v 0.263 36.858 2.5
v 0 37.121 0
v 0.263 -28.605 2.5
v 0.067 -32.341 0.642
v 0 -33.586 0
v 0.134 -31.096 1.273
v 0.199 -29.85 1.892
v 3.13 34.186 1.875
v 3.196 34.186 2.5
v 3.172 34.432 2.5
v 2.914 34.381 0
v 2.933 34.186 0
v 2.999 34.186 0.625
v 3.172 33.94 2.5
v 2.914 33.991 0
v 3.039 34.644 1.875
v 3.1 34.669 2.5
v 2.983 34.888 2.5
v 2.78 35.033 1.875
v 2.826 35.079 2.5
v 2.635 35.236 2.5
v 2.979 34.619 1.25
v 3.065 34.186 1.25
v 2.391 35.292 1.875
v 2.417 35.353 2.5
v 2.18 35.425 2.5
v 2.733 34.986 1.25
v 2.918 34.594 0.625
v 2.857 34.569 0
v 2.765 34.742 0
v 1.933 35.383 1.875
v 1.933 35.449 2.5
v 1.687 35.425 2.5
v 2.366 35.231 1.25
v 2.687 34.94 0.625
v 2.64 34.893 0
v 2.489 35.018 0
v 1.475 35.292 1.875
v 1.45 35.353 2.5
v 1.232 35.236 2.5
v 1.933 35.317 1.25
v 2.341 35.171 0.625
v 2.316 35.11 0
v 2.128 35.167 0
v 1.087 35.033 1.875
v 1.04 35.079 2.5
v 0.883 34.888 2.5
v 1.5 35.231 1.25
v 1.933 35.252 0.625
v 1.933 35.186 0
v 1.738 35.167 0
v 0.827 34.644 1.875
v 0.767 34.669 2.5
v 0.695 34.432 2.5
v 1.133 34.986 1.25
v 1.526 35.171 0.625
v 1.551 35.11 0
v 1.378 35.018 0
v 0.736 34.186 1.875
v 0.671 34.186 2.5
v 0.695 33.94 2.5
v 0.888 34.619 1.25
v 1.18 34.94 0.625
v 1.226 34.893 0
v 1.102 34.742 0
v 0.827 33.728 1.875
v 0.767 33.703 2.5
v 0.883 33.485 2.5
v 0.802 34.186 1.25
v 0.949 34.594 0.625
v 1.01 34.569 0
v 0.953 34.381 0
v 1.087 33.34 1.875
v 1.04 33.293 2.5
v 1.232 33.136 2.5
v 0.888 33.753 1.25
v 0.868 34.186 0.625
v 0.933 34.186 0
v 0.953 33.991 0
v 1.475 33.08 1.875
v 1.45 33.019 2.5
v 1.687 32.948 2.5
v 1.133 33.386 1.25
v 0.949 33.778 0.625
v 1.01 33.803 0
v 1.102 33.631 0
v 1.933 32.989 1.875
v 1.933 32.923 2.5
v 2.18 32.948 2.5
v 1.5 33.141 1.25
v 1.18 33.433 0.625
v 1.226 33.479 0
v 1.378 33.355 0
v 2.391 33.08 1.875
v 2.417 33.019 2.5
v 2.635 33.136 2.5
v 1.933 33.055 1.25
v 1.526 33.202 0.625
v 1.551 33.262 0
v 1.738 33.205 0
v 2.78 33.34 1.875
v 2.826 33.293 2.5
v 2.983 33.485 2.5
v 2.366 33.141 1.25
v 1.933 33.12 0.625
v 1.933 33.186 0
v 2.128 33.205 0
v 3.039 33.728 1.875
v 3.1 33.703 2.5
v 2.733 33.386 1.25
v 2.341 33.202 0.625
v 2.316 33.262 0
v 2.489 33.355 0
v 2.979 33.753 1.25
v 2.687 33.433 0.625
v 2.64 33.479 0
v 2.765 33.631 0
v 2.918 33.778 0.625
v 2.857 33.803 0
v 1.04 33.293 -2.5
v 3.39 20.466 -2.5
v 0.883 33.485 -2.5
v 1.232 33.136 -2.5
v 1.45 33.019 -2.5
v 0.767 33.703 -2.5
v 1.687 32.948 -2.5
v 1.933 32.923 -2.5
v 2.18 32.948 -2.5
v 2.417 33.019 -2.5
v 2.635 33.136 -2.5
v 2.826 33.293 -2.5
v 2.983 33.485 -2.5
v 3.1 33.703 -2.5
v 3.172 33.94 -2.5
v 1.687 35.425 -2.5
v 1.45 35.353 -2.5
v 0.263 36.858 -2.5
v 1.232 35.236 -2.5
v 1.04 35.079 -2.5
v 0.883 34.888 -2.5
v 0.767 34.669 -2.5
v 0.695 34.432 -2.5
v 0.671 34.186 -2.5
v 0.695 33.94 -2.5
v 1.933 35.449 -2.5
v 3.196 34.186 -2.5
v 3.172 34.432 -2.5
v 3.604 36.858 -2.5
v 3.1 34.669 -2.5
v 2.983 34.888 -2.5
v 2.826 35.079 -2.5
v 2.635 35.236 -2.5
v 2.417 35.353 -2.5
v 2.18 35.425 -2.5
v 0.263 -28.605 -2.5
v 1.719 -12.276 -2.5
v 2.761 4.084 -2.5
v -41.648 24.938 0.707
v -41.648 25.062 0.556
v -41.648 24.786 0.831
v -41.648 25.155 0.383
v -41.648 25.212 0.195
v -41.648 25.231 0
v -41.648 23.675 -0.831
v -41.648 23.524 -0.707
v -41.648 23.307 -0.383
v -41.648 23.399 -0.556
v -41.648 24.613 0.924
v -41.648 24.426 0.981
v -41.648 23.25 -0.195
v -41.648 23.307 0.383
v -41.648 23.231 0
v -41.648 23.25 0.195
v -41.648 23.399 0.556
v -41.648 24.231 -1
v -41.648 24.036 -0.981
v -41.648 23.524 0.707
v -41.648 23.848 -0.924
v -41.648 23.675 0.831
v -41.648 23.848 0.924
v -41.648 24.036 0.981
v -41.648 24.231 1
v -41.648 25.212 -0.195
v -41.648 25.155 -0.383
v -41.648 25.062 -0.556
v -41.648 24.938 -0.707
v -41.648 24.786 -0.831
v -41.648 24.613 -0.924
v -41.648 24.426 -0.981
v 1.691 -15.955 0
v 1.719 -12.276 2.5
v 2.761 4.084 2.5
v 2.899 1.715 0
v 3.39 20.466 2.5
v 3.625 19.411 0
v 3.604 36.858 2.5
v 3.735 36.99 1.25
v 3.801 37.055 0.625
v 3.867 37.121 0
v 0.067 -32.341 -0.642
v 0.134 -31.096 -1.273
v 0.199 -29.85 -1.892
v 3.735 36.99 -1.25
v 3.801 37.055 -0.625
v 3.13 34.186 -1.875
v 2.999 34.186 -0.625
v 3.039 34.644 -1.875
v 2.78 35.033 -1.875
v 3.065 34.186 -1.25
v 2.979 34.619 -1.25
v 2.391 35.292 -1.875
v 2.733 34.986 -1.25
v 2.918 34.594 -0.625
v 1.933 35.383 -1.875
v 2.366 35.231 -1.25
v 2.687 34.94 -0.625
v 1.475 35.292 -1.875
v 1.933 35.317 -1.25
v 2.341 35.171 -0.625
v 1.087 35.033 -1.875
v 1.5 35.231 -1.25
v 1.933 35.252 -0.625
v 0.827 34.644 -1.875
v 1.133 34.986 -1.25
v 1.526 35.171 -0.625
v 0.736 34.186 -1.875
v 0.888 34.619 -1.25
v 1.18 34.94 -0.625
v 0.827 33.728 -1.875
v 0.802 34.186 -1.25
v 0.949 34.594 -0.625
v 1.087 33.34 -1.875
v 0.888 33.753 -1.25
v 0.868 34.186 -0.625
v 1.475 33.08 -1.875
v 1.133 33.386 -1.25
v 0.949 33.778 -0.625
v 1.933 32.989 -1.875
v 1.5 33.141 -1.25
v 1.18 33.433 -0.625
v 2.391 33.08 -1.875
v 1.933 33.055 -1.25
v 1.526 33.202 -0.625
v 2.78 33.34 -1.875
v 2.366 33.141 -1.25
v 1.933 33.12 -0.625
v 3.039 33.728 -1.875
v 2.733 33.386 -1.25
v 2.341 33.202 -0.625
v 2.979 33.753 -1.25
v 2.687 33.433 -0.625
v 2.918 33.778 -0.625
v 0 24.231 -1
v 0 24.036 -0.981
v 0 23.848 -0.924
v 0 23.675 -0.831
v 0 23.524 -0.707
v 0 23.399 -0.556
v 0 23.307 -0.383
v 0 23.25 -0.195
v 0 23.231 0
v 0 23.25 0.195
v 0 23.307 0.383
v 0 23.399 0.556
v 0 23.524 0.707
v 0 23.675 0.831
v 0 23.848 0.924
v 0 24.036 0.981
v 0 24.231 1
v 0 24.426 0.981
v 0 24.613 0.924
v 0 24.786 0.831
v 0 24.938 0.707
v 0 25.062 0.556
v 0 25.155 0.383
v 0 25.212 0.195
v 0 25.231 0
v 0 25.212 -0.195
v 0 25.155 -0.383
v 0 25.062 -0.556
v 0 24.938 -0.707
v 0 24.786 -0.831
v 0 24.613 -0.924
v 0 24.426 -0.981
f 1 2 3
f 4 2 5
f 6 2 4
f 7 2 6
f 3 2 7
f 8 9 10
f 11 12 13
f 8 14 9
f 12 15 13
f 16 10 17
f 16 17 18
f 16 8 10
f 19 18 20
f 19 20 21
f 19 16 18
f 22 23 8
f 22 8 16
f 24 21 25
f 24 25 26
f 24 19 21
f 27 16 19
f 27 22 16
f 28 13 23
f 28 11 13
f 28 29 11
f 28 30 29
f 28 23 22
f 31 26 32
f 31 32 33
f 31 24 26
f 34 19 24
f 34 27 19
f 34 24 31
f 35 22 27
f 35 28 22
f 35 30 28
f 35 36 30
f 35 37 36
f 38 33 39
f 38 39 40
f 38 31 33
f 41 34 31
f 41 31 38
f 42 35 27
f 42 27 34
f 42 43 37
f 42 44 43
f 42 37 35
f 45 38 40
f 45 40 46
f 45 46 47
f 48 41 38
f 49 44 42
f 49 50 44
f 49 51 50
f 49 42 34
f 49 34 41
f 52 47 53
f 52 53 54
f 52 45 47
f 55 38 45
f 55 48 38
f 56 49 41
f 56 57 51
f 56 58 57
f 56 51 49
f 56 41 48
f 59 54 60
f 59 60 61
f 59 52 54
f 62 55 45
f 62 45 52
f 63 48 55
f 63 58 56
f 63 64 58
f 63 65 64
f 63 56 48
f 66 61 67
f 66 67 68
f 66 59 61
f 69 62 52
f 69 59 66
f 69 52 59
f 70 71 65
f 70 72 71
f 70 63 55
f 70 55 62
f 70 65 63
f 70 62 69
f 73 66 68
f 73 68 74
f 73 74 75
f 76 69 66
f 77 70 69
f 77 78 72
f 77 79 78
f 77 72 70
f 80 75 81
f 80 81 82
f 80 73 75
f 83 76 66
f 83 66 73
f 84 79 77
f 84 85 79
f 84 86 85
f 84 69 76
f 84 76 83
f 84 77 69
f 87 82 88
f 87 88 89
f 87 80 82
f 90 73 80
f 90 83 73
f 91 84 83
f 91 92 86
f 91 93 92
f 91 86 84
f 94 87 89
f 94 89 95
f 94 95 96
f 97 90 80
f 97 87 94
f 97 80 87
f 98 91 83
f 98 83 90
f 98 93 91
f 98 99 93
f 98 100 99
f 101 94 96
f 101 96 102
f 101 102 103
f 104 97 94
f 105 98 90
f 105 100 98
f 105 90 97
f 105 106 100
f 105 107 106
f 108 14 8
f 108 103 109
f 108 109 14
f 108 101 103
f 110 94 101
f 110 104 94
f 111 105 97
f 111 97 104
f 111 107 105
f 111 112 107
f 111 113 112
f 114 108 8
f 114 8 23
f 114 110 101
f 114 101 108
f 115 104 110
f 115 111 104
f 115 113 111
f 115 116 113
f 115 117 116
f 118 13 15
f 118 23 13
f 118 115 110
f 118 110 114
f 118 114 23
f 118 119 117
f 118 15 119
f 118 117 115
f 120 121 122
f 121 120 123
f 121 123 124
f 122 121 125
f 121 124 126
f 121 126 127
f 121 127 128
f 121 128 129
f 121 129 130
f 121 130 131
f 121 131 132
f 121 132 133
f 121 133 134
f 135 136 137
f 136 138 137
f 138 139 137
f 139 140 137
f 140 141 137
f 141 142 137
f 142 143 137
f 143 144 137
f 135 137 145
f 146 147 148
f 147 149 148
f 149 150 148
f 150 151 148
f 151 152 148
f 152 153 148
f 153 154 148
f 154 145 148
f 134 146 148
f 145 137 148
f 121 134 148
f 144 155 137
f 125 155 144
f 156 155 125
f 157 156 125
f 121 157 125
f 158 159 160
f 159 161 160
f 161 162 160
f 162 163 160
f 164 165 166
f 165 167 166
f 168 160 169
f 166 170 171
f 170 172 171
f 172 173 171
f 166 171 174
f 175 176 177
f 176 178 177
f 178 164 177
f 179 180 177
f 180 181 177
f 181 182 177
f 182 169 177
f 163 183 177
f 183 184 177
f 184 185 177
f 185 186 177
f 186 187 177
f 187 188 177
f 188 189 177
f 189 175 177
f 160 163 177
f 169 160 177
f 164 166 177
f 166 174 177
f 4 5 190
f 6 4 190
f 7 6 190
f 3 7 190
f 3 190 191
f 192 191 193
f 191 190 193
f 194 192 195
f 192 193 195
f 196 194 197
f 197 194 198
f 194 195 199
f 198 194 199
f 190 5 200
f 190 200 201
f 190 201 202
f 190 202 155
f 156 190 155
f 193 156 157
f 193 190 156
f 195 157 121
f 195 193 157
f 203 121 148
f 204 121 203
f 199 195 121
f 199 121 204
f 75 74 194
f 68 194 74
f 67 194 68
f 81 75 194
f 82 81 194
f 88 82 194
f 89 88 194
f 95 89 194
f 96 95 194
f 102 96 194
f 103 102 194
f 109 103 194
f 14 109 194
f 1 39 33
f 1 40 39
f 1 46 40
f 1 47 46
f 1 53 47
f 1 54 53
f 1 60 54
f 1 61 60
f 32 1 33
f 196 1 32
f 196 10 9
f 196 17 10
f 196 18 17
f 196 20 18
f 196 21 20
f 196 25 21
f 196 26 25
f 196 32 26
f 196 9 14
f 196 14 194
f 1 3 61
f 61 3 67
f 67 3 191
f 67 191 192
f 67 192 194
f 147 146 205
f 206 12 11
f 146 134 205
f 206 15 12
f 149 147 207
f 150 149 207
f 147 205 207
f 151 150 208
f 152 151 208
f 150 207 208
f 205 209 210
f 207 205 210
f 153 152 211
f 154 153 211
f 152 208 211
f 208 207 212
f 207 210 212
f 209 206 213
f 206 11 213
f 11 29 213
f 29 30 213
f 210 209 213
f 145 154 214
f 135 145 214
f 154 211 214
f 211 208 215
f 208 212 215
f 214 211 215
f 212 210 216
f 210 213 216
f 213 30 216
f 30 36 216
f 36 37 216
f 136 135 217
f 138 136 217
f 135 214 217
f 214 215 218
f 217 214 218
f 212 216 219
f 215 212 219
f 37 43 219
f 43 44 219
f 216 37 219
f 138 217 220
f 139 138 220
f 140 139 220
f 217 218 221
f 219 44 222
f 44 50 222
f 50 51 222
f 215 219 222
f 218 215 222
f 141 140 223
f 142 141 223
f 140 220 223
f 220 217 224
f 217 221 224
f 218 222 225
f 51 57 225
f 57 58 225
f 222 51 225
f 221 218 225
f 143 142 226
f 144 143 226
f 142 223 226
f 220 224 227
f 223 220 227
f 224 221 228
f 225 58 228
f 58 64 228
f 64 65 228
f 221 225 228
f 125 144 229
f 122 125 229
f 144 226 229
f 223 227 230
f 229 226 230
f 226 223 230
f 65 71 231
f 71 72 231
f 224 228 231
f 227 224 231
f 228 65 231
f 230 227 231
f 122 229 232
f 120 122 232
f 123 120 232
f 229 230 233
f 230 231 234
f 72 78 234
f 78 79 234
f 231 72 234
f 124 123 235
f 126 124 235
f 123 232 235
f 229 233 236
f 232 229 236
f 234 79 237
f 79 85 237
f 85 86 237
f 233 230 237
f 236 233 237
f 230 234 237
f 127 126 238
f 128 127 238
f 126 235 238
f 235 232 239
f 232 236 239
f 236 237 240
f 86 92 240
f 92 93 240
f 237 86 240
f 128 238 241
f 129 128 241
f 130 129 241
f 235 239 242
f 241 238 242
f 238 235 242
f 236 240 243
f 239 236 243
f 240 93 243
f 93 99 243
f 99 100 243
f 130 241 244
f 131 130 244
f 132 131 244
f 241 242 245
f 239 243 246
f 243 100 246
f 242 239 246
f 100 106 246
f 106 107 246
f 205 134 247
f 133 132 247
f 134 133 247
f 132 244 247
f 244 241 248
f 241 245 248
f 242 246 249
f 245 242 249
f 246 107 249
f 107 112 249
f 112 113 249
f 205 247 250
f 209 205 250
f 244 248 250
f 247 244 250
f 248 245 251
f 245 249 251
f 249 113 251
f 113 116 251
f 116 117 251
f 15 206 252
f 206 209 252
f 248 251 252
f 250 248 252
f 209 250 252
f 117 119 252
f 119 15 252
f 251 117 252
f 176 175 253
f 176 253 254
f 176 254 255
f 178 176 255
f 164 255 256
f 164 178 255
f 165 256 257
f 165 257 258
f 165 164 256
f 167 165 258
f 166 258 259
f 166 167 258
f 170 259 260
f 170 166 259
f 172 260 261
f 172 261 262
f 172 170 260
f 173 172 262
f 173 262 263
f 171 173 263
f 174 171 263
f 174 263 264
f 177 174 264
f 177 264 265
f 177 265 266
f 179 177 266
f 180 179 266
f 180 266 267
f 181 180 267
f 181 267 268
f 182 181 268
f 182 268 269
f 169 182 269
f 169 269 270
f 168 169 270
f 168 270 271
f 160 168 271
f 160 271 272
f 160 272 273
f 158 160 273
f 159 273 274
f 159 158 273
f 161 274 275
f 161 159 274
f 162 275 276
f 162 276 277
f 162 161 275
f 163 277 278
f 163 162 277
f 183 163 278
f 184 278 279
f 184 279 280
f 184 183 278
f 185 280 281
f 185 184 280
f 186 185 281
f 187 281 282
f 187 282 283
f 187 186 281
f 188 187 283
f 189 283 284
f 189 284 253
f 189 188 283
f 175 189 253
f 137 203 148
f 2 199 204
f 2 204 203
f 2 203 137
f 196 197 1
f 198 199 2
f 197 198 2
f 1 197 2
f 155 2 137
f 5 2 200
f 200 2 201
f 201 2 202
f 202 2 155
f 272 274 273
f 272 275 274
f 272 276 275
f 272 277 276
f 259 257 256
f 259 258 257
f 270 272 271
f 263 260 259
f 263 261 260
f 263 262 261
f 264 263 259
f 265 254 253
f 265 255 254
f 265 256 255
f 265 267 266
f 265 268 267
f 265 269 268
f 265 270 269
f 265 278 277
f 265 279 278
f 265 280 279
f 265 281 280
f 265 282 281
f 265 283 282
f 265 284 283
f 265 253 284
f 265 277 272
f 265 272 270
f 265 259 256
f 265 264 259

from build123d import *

# Parameters (mm, degrees)
SKETCH1_R                     = 1
BOSS_EXTRUDE1_DEPTH           = 2.5
BOSS_EXTRUDE1_DRAFT           = 6
BOSS_EXTRUDE1_OTHER_WAY_DEPTH = 2.5
BOSS_EXTRUDE1_OTHER_WAY_DRAFT = -6
SKETCH2_R                     = 1


with BuildPart() as part:
    # Sketch1 → Boss-Extrude1 (with draft: the straight prism first)
    with BuildSketch(Plane.XY):
        with BuildLine():
            Line((0, 37.120938716), (0, -33.585611219))
            ThreePointArc((0, -33.585611219), (2.89935164, 1.714837296), (3.86676445, 37.120938716))
            Line((3.86676445, 37.120938716), (0, 37.120938716))
        make_face()
        with Locations((1.933382225, 34.186107729)):
            Circle(SKETCH1_R, mode=Mode.SUBTRACT)
    extrude(amount=BOSS_EXTRUDE1_DEPTH)
    # Boss-Extrude1: the draft: its side faces are tilted about the plane it starts from
    boss_extrude1_sides = [part.faces().sort_by_distance(p)[0] for p in [
        (1.933382225, 37.120938716, 1.25),
        (0, 1.767663748, 1.25),
        (2.89935164, 1.714837296, 1.25),
        (0.933382225, 34.186107729, 1.25),
    ]]
    draft(boss_extrude1_sides, Plane.XY, BOSS_EXTRUDE1_DRAFT)


with BuildPart() as boss_extrude1_other_way_tool:
    # Sketch1 → Boss-Extrude1 other way (with draft: the straight prism first)
    with BuildSketch(Plane.XY):
        with BuildLine():
            Line((0, 37.120938716), (0, -33.585611219))
            ThreePointArc((0, -33.585611219), (2.89935164, 1.714837296), (3.86676445, 37.120938716))
            Line((3.86676445, 37.120938716), (0, 37.120938716))
        make_face()
        with Locations((1.933382225, 34.186107729)):
            Circle(SKETCH1_R, mode=Mode.SUBTRACT)
    extrude(amount=-BOSS_EXTRUDE1_OTHER_WAY_DEPTH)
    # Boss-Extrude1 other way: the draft: its side faces are tilted about the plane it starts from
    boss_extrude1_other_way_sides = [boss_extrude1_other_way_tool.faces().sort_by_distance(p)[0] for p in [
        (1.933382225, 37.120938716, -1.25),
        (0, 1.767663748, -1.25),
        (2.89935164, 1.714837296, -1.25),
        (0.933382225, 34.186107729, -1.25),
    ]]
    draft(boss_extrude1_other_way_sides, Plane.XY, BOSS_EXTRUDE1_OTHER_WAY_DRAFT)


with BuildPart() as part_1:
    add(part.part)

    # Boss-Extrude1 other way: add boss_extrude1_other_way_tool
    add(boss_extrude1_other_way_tool.part)


with BuildPart() as body_2:
    # Sweep1: sweep along a path in Sketch3
    with BuildLine(Plane.XY) as sweep1_path:
        Line((0, 28.760399507), (-41.648385585, 28.760399507))
    # Sketch2 → Sweep1 (sweep)
    with BuildSketch(Plane(origin=(0, 0, 0), x_dir=(0, 0, -1), z_dir=(1, 0, 0))):
        with Locations((0, 24.23081472)):
            Circle(SKETCH2_R)
    sweep(path=sweep1_path.line)


solid = Compound([part_1.part, body_2.part])
